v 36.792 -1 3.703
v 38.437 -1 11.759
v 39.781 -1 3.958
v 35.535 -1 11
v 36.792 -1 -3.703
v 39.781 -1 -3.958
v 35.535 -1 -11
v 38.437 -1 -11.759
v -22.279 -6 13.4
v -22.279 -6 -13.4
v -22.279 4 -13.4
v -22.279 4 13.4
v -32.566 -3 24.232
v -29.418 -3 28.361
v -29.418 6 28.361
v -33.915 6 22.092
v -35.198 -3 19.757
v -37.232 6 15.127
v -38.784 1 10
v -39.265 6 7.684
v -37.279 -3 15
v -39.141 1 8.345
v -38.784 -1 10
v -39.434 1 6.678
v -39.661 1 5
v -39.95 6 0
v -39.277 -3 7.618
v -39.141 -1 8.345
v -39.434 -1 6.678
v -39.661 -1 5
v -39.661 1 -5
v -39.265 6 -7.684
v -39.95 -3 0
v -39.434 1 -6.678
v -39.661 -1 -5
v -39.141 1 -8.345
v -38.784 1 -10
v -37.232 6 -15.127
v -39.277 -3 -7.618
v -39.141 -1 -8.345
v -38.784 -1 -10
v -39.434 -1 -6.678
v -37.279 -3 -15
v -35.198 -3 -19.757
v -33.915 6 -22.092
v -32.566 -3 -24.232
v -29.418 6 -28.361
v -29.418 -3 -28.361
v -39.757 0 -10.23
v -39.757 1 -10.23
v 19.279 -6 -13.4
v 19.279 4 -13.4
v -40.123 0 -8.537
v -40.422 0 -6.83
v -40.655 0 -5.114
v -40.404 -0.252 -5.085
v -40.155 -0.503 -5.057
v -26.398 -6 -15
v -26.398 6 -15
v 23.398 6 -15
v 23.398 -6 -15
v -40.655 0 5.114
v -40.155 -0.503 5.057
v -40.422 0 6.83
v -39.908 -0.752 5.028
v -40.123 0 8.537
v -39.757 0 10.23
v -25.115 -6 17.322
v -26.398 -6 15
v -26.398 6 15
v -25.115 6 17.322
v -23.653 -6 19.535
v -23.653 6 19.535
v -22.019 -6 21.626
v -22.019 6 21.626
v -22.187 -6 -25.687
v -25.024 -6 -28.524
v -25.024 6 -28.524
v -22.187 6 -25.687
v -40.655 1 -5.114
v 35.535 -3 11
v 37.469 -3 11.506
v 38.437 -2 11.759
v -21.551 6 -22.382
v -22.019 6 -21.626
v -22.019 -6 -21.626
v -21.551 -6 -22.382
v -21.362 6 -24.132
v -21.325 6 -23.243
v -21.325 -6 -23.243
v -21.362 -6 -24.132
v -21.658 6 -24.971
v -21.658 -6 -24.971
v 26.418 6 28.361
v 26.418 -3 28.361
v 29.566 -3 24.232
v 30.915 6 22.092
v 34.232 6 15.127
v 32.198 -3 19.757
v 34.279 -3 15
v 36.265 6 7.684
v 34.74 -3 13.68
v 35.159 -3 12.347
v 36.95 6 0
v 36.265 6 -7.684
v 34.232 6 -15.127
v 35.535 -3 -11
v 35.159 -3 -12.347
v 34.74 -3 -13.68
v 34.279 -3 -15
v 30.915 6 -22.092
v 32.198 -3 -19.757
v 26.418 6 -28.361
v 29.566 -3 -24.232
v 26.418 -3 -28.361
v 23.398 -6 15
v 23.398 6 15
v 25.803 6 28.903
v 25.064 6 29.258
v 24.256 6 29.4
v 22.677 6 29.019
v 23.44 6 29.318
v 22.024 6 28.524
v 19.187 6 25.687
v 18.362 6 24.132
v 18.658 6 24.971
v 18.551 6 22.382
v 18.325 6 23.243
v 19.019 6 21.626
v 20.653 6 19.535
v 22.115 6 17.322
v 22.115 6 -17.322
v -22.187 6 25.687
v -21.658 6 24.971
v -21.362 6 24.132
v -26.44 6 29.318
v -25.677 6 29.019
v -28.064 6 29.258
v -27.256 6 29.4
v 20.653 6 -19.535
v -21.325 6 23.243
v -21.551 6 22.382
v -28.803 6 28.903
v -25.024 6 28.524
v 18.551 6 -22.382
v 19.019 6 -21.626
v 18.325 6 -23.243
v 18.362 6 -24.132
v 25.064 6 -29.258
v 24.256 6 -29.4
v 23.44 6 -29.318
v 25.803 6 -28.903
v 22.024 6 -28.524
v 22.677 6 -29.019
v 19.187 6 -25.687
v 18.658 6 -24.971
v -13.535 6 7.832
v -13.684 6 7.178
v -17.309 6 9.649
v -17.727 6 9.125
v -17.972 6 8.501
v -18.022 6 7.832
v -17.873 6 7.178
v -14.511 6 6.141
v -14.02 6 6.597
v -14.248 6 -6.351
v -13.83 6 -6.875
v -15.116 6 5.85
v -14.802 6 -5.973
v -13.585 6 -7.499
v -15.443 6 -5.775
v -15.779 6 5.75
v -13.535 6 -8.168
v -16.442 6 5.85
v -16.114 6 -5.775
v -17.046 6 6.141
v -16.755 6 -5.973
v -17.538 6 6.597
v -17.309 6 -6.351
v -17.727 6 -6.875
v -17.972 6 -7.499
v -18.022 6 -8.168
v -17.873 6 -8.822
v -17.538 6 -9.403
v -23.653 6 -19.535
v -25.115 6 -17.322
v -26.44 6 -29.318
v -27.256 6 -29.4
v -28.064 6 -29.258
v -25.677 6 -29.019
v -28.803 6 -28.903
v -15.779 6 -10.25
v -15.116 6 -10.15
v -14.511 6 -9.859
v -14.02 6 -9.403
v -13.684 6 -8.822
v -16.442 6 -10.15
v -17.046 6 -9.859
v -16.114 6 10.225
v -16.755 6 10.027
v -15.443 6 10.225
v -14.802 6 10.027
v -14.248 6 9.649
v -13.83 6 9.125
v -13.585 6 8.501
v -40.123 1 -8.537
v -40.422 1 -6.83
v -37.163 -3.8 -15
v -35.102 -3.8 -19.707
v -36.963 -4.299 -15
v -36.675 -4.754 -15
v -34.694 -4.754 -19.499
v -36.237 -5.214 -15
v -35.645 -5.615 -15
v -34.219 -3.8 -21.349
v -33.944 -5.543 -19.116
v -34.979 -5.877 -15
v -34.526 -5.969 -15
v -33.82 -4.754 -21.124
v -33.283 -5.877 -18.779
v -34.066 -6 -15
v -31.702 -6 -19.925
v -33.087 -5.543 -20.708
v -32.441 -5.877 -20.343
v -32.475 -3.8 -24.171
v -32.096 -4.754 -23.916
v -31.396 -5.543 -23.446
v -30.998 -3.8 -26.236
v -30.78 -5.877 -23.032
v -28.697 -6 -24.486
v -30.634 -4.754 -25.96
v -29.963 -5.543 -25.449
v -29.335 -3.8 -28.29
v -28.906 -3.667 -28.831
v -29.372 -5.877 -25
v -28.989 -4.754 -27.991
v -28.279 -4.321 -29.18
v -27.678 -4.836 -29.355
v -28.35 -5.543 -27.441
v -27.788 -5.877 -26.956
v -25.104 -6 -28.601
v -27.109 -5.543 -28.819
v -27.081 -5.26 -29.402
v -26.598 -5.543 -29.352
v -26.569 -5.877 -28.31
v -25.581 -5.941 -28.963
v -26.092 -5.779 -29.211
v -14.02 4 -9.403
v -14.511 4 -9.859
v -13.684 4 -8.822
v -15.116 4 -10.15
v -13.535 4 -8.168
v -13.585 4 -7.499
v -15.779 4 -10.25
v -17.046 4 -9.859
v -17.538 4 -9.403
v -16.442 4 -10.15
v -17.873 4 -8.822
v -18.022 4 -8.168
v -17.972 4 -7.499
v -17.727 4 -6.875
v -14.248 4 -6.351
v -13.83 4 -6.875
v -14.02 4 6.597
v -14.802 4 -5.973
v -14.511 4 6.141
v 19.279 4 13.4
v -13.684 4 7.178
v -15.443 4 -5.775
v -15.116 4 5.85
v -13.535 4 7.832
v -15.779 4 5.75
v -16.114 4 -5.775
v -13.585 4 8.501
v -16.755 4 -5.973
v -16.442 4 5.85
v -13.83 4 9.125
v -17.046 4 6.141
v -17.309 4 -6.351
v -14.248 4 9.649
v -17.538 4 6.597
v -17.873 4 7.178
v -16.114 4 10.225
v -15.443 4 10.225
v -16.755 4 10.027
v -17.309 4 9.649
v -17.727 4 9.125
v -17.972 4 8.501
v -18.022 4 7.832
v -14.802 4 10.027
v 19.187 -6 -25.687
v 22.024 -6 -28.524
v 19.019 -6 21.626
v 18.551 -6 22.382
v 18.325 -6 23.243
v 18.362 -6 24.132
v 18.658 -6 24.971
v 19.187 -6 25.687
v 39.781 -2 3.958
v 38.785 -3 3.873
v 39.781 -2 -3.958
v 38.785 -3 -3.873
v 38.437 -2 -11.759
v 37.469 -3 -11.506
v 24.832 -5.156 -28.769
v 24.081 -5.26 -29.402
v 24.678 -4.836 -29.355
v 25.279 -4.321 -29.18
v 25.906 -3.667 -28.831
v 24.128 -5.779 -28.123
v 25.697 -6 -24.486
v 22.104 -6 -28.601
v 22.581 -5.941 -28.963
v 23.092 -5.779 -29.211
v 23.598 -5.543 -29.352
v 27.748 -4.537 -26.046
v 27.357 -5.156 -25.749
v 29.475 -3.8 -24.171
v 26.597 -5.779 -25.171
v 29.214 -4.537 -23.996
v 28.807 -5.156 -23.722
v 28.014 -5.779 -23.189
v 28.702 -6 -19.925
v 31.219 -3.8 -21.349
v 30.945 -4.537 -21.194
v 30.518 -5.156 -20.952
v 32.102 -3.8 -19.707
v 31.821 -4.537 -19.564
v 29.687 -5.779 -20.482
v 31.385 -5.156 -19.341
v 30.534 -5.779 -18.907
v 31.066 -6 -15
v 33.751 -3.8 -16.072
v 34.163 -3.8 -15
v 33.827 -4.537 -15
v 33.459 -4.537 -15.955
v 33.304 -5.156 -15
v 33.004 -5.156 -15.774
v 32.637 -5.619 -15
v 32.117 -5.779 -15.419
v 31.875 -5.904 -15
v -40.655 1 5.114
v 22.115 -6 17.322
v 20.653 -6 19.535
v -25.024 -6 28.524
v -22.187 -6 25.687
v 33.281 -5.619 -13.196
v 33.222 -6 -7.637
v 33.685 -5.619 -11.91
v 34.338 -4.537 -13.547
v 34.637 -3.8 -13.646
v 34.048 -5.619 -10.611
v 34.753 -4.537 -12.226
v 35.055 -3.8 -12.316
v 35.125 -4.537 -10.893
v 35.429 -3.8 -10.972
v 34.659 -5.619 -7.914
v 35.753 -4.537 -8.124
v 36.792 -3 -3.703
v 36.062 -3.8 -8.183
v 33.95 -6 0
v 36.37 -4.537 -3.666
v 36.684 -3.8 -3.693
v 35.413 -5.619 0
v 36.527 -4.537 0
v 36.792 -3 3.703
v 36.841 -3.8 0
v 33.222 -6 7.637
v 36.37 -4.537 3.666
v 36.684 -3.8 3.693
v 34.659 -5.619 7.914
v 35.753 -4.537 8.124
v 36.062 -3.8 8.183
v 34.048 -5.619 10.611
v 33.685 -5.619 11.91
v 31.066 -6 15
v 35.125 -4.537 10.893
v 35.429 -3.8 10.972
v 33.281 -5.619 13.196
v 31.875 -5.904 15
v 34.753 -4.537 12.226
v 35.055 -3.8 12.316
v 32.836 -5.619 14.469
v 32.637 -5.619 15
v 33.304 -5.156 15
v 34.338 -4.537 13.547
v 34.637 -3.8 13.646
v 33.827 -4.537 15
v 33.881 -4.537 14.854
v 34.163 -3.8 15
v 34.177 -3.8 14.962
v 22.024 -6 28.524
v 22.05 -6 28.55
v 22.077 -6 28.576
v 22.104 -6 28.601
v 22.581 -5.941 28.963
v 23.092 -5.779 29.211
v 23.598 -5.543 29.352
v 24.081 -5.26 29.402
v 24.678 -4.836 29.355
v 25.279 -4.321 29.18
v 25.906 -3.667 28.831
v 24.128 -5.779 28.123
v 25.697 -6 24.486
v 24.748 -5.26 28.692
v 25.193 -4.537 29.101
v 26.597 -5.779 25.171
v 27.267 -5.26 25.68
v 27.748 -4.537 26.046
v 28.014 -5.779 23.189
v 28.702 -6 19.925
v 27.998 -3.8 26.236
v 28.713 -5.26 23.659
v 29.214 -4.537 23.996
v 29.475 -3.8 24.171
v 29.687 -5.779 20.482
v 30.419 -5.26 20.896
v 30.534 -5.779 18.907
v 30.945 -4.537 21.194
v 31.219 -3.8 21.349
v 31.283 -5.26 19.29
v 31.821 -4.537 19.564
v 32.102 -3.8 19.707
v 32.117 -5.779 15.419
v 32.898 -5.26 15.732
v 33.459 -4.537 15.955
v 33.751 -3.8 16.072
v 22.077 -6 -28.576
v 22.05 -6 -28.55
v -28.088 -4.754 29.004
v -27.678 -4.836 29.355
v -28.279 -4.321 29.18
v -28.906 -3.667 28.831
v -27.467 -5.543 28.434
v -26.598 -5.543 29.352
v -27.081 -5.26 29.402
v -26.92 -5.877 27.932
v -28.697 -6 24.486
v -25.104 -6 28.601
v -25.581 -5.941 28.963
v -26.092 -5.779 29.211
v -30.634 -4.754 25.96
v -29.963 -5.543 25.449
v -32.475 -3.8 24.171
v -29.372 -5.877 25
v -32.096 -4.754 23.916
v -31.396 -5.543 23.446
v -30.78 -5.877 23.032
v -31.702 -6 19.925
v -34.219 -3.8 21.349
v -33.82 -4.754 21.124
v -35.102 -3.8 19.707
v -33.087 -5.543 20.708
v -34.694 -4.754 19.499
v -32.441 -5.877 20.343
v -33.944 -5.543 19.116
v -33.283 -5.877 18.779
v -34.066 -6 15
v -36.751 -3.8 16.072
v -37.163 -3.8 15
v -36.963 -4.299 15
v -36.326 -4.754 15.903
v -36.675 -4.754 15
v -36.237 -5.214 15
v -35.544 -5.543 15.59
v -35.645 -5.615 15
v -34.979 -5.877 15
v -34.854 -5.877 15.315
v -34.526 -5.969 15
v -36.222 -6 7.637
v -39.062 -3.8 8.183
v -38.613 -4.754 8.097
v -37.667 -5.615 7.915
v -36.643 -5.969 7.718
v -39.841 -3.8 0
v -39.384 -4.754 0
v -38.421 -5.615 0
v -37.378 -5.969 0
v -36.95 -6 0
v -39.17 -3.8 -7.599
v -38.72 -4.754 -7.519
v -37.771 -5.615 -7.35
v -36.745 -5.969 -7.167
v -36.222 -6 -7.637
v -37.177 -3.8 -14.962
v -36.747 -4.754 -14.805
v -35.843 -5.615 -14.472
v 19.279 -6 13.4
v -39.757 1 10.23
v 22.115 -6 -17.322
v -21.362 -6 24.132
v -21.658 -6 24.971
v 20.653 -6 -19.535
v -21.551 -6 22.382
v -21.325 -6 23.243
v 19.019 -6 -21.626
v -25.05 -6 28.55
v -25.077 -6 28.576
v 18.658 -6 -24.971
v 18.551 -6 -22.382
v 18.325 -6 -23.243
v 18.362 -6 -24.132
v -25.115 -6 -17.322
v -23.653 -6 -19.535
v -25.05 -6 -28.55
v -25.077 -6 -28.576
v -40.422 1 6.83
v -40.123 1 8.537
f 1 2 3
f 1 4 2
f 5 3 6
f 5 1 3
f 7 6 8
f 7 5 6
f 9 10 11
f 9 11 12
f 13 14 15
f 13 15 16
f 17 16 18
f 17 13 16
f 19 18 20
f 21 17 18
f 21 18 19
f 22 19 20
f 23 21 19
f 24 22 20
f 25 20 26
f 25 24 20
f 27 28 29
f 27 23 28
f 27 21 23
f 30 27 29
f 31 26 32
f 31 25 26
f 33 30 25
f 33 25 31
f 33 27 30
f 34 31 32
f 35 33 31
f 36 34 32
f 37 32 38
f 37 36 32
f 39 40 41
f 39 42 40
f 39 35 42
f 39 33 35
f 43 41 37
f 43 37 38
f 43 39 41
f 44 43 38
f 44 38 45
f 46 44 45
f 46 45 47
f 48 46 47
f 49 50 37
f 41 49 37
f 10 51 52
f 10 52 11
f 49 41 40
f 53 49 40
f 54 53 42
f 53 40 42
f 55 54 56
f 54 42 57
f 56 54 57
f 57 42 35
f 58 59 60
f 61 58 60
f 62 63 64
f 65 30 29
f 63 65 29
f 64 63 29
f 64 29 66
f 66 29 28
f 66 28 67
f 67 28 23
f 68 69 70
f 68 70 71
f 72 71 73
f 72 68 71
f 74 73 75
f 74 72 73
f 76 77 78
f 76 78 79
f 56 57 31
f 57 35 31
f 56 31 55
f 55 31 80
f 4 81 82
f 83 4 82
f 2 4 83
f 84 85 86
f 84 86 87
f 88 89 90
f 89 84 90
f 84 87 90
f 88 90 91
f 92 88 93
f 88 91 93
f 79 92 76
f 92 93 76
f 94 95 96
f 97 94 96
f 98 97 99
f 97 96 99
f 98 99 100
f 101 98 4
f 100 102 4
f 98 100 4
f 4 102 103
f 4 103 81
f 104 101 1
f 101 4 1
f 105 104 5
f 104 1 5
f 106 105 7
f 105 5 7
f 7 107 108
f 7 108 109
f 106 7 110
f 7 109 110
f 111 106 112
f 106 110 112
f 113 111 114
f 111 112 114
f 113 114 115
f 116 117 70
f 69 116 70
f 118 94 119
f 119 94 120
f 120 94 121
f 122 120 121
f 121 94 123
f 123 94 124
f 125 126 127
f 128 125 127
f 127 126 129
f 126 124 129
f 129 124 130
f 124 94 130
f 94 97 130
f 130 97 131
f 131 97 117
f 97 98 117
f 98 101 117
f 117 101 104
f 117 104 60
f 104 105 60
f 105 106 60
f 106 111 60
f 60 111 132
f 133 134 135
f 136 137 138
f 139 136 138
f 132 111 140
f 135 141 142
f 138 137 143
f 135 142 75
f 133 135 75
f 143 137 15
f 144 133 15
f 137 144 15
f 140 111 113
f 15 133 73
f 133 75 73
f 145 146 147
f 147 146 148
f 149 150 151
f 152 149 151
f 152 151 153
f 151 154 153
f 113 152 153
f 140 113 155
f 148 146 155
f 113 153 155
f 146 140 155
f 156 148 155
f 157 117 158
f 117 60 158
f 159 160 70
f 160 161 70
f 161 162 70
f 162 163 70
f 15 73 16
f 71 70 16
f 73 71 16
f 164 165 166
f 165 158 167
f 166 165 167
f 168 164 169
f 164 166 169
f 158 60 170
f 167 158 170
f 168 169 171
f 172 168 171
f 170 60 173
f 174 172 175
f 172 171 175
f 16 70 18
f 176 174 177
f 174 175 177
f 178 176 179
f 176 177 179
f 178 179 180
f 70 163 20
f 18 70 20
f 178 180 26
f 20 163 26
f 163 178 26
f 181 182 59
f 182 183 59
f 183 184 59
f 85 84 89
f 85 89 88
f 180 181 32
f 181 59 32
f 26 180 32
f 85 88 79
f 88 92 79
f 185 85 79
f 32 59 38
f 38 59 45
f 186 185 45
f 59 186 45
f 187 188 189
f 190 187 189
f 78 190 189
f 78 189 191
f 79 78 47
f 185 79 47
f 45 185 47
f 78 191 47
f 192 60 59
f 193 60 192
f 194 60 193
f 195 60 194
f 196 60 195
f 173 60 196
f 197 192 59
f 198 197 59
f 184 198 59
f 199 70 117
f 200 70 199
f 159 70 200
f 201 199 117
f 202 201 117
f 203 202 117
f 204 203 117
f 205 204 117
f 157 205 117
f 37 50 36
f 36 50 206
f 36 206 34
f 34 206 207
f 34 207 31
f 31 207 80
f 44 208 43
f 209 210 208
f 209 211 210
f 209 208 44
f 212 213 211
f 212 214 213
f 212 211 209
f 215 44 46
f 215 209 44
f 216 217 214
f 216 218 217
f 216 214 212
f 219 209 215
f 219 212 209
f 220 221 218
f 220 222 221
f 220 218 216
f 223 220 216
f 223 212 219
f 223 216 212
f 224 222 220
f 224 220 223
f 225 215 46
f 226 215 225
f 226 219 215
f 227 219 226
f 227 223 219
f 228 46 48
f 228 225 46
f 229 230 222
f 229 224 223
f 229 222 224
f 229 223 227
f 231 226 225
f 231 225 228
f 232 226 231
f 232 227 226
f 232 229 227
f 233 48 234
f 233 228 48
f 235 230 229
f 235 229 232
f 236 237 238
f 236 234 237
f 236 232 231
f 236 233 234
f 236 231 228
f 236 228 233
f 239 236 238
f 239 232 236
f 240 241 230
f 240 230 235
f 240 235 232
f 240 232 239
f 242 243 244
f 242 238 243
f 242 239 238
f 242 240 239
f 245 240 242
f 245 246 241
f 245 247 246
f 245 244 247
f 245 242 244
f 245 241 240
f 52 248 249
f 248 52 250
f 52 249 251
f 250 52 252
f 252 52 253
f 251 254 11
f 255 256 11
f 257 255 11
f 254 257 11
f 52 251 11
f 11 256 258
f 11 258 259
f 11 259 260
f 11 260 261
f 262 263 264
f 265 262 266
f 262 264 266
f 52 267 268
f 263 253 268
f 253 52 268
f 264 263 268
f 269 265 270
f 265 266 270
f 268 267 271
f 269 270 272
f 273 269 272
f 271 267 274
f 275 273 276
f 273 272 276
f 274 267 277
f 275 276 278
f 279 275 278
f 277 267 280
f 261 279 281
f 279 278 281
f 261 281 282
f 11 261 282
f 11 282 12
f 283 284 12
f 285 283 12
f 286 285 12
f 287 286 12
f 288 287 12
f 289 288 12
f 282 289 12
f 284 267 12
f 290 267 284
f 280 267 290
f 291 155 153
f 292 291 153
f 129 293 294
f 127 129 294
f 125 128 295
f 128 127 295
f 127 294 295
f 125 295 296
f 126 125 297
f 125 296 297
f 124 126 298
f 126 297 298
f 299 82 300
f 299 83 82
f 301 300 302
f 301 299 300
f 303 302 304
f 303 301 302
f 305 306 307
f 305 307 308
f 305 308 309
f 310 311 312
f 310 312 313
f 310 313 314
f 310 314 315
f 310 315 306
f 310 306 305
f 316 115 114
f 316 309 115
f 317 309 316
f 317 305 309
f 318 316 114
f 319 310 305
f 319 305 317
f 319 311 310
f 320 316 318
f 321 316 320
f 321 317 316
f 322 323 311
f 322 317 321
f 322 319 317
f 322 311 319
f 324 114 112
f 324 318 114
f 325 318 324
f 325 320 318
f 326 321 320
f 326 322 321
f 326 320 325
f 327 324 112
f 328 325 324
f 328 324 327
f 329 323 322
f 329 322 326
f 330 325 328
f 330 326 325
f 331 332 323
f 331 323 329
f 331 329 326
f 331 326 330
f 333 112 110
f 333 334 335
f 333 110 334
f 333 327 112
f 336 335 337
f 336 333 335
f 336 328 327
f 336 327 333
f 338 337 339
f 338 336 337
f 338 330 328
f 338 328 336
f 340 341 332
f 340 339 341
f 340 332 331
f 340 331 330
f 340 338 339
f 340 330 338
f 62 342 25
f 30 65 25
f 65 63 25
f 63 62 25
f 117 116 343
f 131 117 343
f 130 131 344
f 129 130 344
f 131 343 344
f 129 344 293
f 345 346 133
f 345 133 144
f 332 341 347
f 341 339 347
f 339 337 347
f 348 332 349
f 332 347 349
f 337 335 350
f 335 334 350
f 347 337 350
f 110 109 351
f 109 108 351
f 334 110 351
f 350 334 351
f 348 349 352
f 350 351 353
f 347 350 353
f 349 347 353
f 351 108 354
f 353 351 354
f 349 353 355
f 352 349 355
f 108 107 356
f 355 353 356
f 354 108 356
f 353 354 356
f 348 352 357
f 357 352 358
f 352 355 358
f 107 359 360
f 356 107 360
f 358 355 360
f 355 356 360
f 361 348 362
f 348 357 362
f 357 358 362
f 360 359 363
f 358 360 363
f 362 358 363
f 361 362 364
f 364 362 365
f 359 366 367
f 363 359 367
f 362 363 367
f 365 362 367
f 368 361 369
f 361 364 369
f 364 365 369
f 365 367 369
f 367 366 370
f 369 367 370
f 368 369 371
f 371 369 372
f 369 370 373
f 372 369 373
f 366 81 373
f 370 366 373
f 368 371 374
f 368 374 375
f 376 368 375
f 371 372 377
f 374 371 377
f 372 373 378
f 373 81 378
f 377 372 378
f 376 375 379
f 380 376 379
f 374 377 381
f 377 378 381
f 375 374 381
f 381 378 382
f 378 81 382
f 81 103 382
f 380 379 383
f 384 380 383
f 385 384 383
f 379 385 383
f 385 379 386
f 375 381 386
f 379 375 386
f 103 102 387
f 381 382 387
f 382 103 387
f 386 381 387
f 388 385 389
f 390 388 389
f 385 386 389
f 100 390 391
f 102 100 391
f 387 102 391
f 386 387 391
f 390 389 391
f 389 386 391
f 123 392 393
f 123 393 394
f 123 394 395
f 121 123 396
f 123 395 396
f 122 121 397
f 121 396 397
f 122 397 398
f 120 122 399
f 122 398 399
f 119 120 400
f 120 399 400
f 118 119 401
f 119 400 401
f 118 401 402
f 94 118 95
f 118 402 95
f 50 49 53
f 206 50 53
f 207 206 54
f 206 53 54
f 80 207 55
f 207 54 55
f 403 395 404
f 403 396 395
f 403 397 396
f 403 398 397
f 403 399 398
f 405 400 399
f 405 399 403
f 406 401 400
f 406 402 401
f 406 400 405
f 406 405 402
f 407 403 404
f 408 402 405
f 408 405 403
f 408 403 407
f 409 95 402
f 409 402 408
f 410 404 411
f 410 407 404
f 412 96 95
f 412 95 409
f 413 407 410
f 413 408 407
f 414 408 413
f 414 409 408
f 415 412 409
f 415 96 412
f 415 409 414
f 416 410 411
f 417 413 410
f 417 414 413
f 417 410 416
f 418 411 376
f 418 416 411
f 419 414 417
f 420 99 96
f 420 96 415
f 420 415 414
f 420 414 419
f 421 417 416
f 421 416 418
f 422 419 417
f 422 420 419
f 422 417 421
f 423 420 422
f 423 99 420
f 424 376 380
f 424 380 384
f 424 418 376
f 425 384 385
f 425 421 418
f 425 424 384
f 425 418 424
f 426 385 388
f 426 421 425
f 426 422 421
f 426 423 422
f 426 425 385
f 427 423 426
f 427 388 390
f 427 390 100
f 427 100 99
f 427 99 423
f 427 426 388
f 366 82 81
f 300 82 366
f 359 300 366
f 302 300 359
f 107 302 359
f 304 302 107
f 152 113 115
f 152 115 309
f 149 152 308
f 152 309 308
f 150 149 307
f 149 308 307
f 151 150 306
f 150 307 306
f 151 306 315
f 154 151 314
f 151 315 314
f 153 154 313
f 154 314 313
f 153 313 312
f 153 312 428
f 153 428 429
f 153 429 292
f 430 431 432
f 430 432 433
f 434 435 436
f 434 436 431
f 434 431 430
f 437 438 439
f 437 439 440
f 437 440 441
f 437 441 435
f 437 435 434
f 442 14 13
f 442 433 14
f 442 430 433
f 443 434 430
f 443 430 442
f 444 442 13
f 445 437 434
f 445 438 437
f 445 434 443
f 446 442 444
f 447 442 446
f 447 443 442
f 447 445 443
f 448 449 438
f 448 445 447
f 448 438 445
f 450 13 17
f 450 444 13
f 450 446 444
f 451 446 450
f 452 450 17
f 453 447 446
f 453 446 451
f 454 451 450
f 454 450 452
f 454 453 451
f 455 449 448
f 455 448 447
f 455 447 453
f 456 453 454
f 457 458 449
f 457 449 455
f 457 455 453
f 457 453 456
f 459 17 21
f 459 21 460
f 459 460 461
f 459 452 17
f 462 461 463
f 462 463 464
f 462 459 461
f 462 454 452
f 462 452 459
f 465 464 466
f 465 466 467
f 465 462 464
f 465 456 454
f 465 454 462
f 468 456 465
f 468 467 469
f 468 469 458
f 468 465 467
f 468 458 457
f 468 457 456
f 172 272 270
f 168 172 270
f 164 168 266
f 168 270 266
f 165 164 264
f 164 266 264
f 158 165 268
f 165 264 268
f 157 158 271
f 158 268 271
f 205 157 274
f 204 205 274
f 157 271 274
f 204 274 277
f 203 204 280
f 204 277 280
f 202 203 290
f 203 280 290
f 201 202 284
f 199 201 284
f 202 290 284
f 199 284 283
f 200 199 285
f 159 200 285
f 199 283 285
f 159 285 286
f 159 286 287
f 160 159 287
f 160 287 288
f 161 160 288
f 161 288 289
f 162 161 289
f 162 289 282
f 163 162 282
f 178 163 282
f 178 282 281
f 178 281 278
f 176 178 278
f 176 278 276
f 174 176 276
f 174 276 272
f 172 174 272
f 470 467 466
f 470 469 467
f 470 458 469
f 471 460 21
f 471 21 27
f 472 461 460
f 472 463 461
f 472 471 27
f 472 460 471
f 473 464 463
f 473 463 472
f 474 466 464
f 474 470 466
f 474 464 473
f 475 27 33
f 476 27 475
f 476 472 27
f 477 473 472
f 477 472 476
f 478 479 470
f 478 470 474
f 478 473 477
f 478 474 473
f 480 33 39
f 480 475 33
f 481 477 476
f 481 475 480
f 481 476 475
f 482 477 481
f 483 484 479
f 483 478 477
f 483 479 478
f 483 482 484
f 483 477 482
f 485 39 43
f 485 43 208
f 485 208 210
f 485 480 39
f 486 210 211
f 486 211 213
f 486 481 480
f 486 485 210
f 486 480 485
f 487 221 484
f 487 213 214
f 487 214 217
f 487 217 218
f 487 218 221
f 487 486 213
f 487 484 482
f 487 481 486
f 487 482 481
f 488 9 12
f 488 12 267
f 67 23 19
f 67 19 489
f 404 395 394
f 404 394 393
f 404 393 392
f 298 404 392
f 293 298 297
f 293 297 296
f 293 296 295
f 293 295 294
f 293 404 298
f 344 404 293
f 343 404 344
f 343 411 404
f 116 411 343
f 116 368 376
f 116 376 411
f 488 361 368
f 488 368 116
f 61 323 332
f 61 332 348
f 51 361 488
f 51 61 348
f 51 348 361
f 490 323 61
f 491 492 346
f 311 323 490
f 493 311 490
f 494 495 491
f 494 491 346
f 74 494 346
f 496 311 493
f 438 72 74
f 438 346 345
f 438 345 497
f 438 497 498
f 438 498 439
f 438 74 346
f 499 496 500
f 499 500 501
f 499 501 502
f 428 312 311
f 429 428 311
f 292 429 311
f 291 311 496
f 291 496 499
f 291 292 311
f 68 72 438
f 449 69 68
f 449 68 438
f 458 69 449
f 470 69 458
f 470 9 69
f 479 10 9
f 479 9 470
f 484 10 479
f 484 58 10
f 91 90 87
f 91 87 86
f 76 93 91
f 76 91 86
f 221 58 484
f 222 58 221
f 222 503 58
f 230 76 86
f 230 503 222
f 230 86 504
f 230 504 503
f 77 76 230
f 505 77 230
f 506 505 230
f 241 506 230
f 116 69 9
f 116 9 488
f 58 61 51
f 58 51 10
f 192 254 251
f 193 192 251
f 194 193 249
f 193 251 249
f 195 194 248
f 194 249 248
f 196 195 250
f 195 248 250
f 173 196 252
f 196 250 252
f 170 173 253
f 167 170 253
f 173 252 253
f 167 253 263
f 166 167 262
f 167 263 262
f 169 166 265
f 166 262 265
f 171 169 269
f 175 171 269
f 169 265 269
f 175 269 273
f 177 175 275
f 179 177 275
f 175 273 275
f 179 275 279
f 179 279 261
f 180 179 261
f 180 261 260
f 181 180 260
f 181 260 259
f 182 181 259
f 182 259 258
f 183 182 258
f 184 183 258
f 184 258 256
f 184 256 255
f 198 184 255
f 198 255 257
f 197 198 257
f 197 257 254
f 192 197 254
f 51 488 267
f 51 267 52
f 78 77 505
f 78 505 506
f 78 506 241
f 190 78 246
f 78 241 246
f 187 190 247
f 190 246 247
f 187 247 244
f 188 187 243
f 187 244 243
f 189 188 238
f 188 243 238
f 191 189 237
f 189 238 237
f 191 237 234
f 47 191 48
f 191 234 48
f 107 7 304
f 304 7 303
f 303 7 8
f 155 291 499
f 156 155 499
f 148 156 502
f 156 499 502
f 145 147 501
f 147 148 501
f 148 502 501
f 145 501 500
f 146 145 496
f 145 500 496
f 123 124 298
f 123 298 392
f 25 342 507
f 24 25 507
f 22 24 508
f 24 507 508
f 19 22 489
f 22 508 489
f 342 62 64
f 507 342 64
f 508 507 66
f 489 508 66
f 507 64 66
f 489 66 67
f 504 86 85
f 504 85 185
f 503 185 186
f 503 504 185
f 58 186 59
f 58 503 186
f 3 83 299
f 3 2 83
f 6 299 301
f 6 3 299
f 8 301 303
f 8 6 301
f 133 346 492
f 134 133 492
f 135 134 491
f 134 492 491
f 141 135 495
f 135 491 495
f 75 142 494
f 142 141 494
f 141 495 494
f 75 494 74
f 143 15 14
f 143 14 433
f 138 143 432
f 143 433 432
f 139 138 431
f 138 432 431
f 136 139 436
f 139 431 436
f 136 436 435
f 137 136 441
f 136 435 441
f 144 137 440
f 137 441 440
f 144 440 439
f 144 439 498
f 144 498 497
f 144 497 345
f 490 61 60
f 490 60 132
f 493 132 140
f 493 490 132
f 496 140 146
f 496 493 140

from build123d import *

# Parameters (mm, degrees)
BOSS_EXTRUDE1_DEPTH = 6
CUT_EXTRUDE3_REACH  = 46.328
SKETCH4_R           = 2.249999999999999
CUT_EXTRUDE5_DEPTH  = 10
FILLET2_R           = 3
CUT_EXTRUDE4_DEPTH  = 46.34730878629092
BOSS_EXTRUDE2_START = -6
BOSS_EXTRUDE2_DEPTH = 12
FILLET1_R           = 3


with BuildPart() as part:
    # Sketch1 → Boss-Extrude1 (new, symmetric)
    with BuildSketch(Plane(origin=(0, 0, 0), x_dir=(1, 0, 0), z_dir=(0, 1, 0))):
        with BuildLine():
            Line((-37.27870154872519, 15), (34.27870154872519, 15.000000000000009))
            ThreePointArc((34.27870154872519, 15.000000000000009), (36.950000000000024, -1.22e-15), (34.27870154872519, -15.000000000000009))
            Line((34.27870154872519, -15.000000000000009), (-37.27870154872519, -15))
            ThreePointArc((-37.27870154872519, -15), (-39.95000000000003, -5.32e-15), (-37.27870154872519, 15))
        make_face()
    extrude(amount=BOSS_EXTRUDE1_DEPTH, both=True)

    # Sketch4 → Cut-Extrude3 (cut, up to next)
    with BuildSketch(Plane.XZ.offset(6), mode=Mode.PRIVATE) as cut_extrude3_sk1:
        with Locations(Location((-15.7787015487252, 7.999999999999995, 0), (0, 0, 270))):
            Circle(SKETCH4_R)
    cut_extrude3_tool1 = extrude(cut_extrude3_sk1.sketch, amount=-CUT_EXTRUDE3_REACH, mode=Mode.PRIVATE) & part.part
    # Sketch4 → Cut-Extrude3 (cut, up to next)
    with BuildSketch(Plane.XZ.offset(6), mode=Mode.PRIVATE) as cut_extrude3_sk2:
        with Locations(Location((-15.778701548725197, -8.000000000000009, 0), (0, 0, 270))):
            Circle(SKETCH4_R)
    cut_extrude3_tool2 = extrude(cut_extrude3_sk2.sketch, amount=-CUT_EXTRUDE3_REACH, mode=Mode.PRIVATE) & part.part
    add(cut_extrude3_tool1.solids().sort_by_distance((-15.778702, -6, 8))[0], mode=Mode.SUBTRACT)
    add(cut_extrude3_tool2.solids().sort_by_distance((-15.778702, -6, -8))[0], mode=Mode.SUBTRACT)

    # Sketch12 → Cut-Extrude5 (cut)
    with BuildSketch(Plane.XZ.offset(6)):
        Polygon((-22.278701548725184, 13.399999999999999), (19.278701548725188, 13.399999999999999), (19.278701548725188, -13.400000000000007), (-22.27870154872518, -13.400000000000007), align=None)
    extrude(amount=-CUT_EXTRUDE5_DEPTH, mode=Mode.SUBTRACT)

    # Fillet2
    fillet2_edges = [part.edges().sort_by_distance(p)[0] for p in [
        (-39.95000000000003, -6, 8.9e-16),
        (36.95000000000002, -6, 4.4e-16),
    ]]
    fillet(fillet2_edges, radius=FILLET2_R)

    # Sweep1: sweep along a path in Sketch6
    with BuildLine(Plane(origin=(0, 0, 0), x_dir=(1, 0, 0), z_dir=(0, 1, 0))) as sweep1_path:
        ThreePointArc((-37.278701548725195, 14.999999999999964), (-39.95000000000002, -1.397e-14), (-37.27870154872519, -15))
    # Sketch5 → Sweep1 (sweep)
    with BuildSketch(Plane.XY):
        Polygon((-39.95000000000002, -0.9999999999999925), (-39.95000000000002, 1.0000000000000122), (-40.950000000000024, 1.000000000000012), (-40.95000000000002, 1.193e-14), align=None)
    sweep(path=sweep1_path.line)

    # Sketch7 → Cut-Extrude4 (cut, through all)
    with BuildSketch(Plane(origin=(0, 6, 0), x_dir=(1, 0, 0), z_dir=(0, 1, 0))):
        with BuildLine():
            ThreePointArc((-38.21722172245879, 15.345224395857285), (-39.06389342380726, 12.810834344677886), (-39.756751371527066, 10.230149597239155))
            Line((-39.75675137152708, 10.230149597239159), (-38.783596110075614, 10.000000000000009))
            ThreePointArc((-38.78359611007561, 10.000000000000005), (-38.106325517759984, 12.52262659789053), (-37.27870154872519, 14.999999999999984))
            Line((-37.27870154872519, 14.999999999999982), (-38.217221722458795, 15.345224395857288))
        make_face()
        with BuildLine():
            Line((-39.6613542419605, 5.000000000000006), (-40.65486268777063, 5.113765835871163))
            ThreePointArc((-40.65486268777062, 5.11376583587116), (-40.95, -1.11e-14), (-40.65486268777061, -5.113765835871172))
            Line((-40.65486268777063, -5.113765835871174), (-39.6613542419605, -4.999999999999996))
            ThreePointArc((-39.66135424196049, -4.999999999999993), (-39.95000000000002, 7.11e-15), (-39.661354241960495, 5.000000000000009))
        make_face()
        with BuildLine():
            Line((-38.783596110075614, -9.999999999999998), (-39.75675137152708, -10.23014959723917))
            ThreePointArc((-39.75675137152705, -10.230149597239167), (-39.06389342380725, -12.810834344677888), (-38.217221722458795, -15.345224395857272))
            Line((-38.2172217224588, -15.345224395857272), (-37.27870154872519, -14.999999999999964))
            ThreePointArc((-37.27870154872519, -14.999999999999964), (-38.10632551776, -12.522626597890516), (-38.78359611007561, -9.999999999999996))
        make_face()
    extrude(amount=-CUT_EXTRUDE4_DEPTH, mode=Mode.SUBTRACT)

    # Sweep2: sweep along a path in Sketch10
    with BuildLine(Plane(origin=(0, 0, 0), x_dir=(1, 0, 0), z_dir=(0, 1, 0))) as sweep2_path:
        ThreePointArc((35.53453936942811, -10.999999999999996), (36.95000000000002, 6.01e-15), (35.53453936942811, 11.000000000000009))
    # Sketch9 → Sweep2 (sweep)
    with BuildSketch(Plane.XY):
        Polygon((39.950000000000024, -2.000000000000001), (38.95000000000003, -3.000000000000001), (36.950000000000024, -3.000000000000001), (36.950000000000024, -1.0000000000000013), (39.950000000000024, -1.000000000000001), align=None)
    sweep(path=sweep2_path.line)

    # Sketch11 → Boss-Extrude2 (add)
    with BuildSketch(Plane(origin=(0, 0, 0), x_dir=(1, 0, 0), z_dir=(0, 1, 0)).offset(BOSS_EXTRUDE2_START)):
        with BuildLine():
            Line((-27.22378964255568, 30.72378964255532), (-20.152721830690165, 23.652721830689885))
            ThreePointArc((-20.152721830690165, 23.652721830689885), (-23.622735246228356, 19.577020528236766), (-26.39820228709416, 14.999999999999972))
            Line((-26.39820228709416, 14.999999999999972), (-37.278701548725195, 14.999999999999964))
            ThreePointArc((-37.278701548725195, 14.999999999999964), (-33.105477074075026, 23.408151319131726), (-27.22378964255568, 30.72378964255532))
        make_face()
        with BuildLine():
            Line((17.152721830690172, 23.652721830689885), (24.22378964255568, 30.72378964255532))
            ThreePointArc((24.22378964255568, 30.72378964255532), (30.10547707407503, 23.40815131913176), (34.27870154872519, 15.000000000000009))
            Line((34.27870154872519, 15.000000000000009), (23.39820228709414, 15.000000000000002))
            ThreePointArc((23.39820228709414, 15.000000000000002), (20.622735246228352, 19.577020528236762), (17.152721830690172, 23.652721830689885))
        make_face()
        with BuildLine():
            Line((34.27870154872519, -15.000000000000009), (23.39820228709414, -15.000000000000002))
            ThreePointArc((23.39820228709414, -15.000000000000002), (20.62273524622831, -19.577020528236723), (17.152721830690172, -23.652721830689885))
            Line((17.152721830690172, -23.652721830689885), (24.22378964255568, -30.72378964255532))
            ThreePointArc((24.22378964255568, -30.72378964255532), (30.105477074074965, -23.40815131913171), (34.27870154872519, -15.000000000000009))
        make_face()
        with BuildLine():
            Line((-37.278701548725195, -14.999999999999964), (-26.39820228709416, -14.999999999999972))
            ThreePointArc((-26.39820228709416, -14.999999999999972), (-23.622735246228356, -19.577020528236766), (-20.152721830690165, -23.652721830689885))
            Line((-20.152721830690165, -23.652721830689885), (-27.22378964255568, -30.72378964255532))
            ThreePointArc((-27.22378964255568, -30.72378964255532), (-33.105477074075026, -23.408151319131726), (-37.278701548725195, -14.999999999999964))
        make_face()
    extrude(amount=BOSS_EXTRUDE2_DEPTH)

    # Fillet1
    # the kernel refuses this fillet: 3 mm, written as the material it takes off along each edge
    with BuildSketch(Plane(origin=(-27.223789642555676, -14.061794859846085, -30.723789642555325), x_dir=(-0.6803801743920825, 0, 0.7328593441406063), z_dir=(0, 1, 0))) as fillet1_piece_1:
        with BuildLine():
            CenterArc((3.113392813537799, 2.997933740985829), FILLET1_R, 177.87335835873736, 94.25328328252505)
            Line((0.11545907255197221, 3.109258871386477), (0, 0))
            ThreePointArc((0, 0), (1.6123589719692206, -0.02992631805525288), (3.224717943938434, -1.4e-16))
        make_face()
    extrude(amount=28.12358971969217, mode=Mode.SUBTRACT)
    with BuildSketch(Plane(origin=(-20.15272183069017, -13.190833558911974, -23.652721830689885), x_dir=(-0.7071067811865506, 0, -0.7071067811865444), z_dir=(0, 1, 0))) as fillet1_piece_2:
        with BuildLine():
            CenterArc((2.8763334235647875, 2.9999999999999987), FILLET1_R, 184.721042367865, 85.27895763213502)
            ThreePointArc((-0.11348825738704518, 2.753086419753086), (-0.02838410706026842, 1.3777122721375448), (0, 0))
            Line((0, 0), (2.8763334235647893, -3e-17))
        make_face()
    extrude(amount=26.38166711782395, mode=Mode.SUBTRACT)
    with BuildSketch(Plane(origin=(3.5000000000005986, -6, 3.9257e-13), x_dir=(-0.983868674569183, 0, -0.1788922334856356), z_dir=(-0.1788922334856356, 0, 0.983868674569183))) as fillet1_piece_3:
        with BuildLine():
            CenterArc((43.45000000000071 - FILLET1_R, -FILLET1_R), FILLET1_R, 8.48e-15, 90)
            Line((43.45000000000071, -FILLET1_R), (43.45000000000071, 0))
            Line((43.45000000000071, 0), (43.45000000000071 - FILLET1_R, 0))
        make_face()
    revolve(axis=Axis((3.5000000000005986, -6, 3.9257e-13), (0, -1, 0)), revolution_arc=44.58500993548746, mode=Mode.SUBTRACT)
    with BuildSketch(Plane(origin=(17.15272183069017, -13.190833558911962, -23.652721830689885), x_dir=(0.6773830058582131, 0, 0.7356305209644934), z_dir=(0, 1, 0))) as fillet1_piece_4:
        with BuildLine():
            CenterArc((2.878986183031824, 2.9974543401739657), FILLET1_R, 182.3605211839325, 85.27895763213502)
            Line((-0.11846815714214187, 2.873892701417236), (0, 0))
            ThreePointArc((0, 0), (1.3777122721375474, 0.02838410706027035), (2.7554245442750958, 2e-17))
        make_face()
    extrude(amount=26.381667117823923, mode=Mode.SUBTRACT)
    with BuildSketch(Plane(origin=(24.22378964255568, -14.06179485984604, -30.72378964255532), x_dir=(-0.707106781186551, 0, 0.7071067811865441), z_dir=(0, 1, 0))) as fillet1_piece_5:
        with BuildLine():
            CenterArc((3.1114018587655967, 2.9999999999999996), FILLET1_R, 175.7467167174752, 94.25328328252476)
            ThreePointArc((0.11966404853807312, 3.222496909765141), (0.02992631805525848, 1.6123589719692129), (0, 0))
            Line((0, 0), (3.1114018587655963, 1.6e-16))
        make_face()
    extrude(amount=28.123589719692085, mode=Mode.SUBTRACT)
    with BuildSketch(Plane(origin=(-6.4999999999996945, -6, -1.6342e-13), x_dir=(0.5751444375352646, 0, -0.8180518785335342), z_dir=(-0.8180518785335342, 0, -0.5751444375352646))) as fillet1_piece_6:
        with BuildLine():
            CenterArc((43.44999999999968 - FILLET1_R, -FILLET1_R), FILLET1_R, 8.48e-15, 90)
            Line((43.44999999999968, -FILLET1_R), (43.44999999999968, 0))
            Line((43.44999999999968, 0), (43.44999999999968 - FILLET1_R, 0))
        make_face()
    revolve(axis=Axis((-6.4999999999996945, -6, -1.6342e-13), (0, -1, 0)), revolution_arc=44.58500993548848, mode=Mode.SUBTRACT)
    with BuildSketch(Plane(origin=(24.22378964255568, -14.061794859846156, 30.723789642555325), x_dir=(-0.7071067811865503, 0, -0.7071067811865447), z_dir=(0, 1, 0))) as fillet1_piece_7:
        with BuildLine():
            CenterArc((3.1114018587656367, -2.999999999999999), FILLET1_R, 90.00000000000006, 94.25328328252562)
            ThreePointArc((0.1196640485381212, -3.222496909765186), (0.02992631805528244, -1.6123589719692302), (0, 0))
            Line((0, 0), (3.1114018587656336, 8e-17))
        make_face()
    extrude(amount=28.12358971969231, mode=Mode.SUBTRACT)
    with BuildSketch(Plane(origin=(17.152721830690176, -13.190833558911836, 23.652721830689888), x_dir=(0.6773830058582013, 0, -0.7356305209645043), z_dir=(0, 1, 0))) as fillet1_piece_8:
        with BuildLine():
            CenterArc((2.8789861830317705, -2.9974543401739693), FILLET1_R, 92.36052118393214, 85.2789576321343)
            Line((-0.11846815714219594, -2.8738927014171836), (0, 0))
            ThreePointArc((0, 0), (1.377712272137523, -0.02838410706026628), (2.75542454427506, -1.6e-16))
        make_face()
    extrude(amount=26.381667117823667, mode=Mode.SUBTRACT)
    with BuildSketch(Plane(origin=(-6.500000000002743, -6, -1.78524e-12), x_dir=(0.5751444375352907, 0, 0.8180518785335158), z_dir=(-0.8180518785335158, 0, 0.5751444375352907))) as fillet1_piece_9:
        with BuildLine():
            CenterArc((43.45000000000323 - FILLET1_R, FILLET1_R), FILLET1_R, 270, 89.99999999999999)
            Line((43.45000000000323, FILLET1_R), (43.45000000000323, 0))
            Line((43.45000000000323, 0), (43.45000000000323 - FILLET1_R, 0))
        make_face()
    revolve(axis=Axis((-6.500000000002743, -6, -1.78524e-12), (0, 1, 0)), revolution_arc=44.58500993548482, mode=Mode.SUBTRACT)
    with BuildSketch(Plane(origin=(-27.223789642555676, -14.06179485984606, 30.723789642555317), x_dir=(0.7071067811865516, 0, -0.7071067811865436), z_dir=(0, 1, 0))) as fillet1_piece_10:
        with BuildLine():
            CenterArc((3.1114018587656043, 3.0000000000000018), FILLET1_R, 175.7467167174751, 94.25328328252488)
            ThreePointArc((0.11966404853808318, 3.2224969097651486), (0.02992631805526974, 1.6123589719692102), (0, 0))
            Line((0, 0), (3.111401858765604, -1e-16))
        make_face()
    extrude(amount=28.12358971969212, mode=Mode.SUBTRACT)
    with BuildSketch(Plane(origin=(-20.15272183069017, -13.190833558911962, 23.652721830689885), x_dir=(-0.6773830058582145, 0, -0.7356305209644921), z_dir=(0, 1, 0))) as fillet1_piece_11:
        with BuildLine():
            CenterArc((2.8789861830318295, 2.9974543401739657), FILLET1_R, 182.36052118393246, 85.27895763213508)
            Line((-0.11846815714213627, 2.8738927014172364), (0, 0))
            ThreePointArc((0, 0), (1.3777122721375523, 0.02838410706027291), (2.7554245442751006, -2e-17))
        make_face()
    extrude(amount=26.381667117823923, mode=Mode.SUBTRACT)
    with BuildSketch(Plane(origin=(3.5000000000005986, -6, -3.9257e-13), x_dir=(-0.5751444375352724, 0, 0.8180518785335287), z_dir=(0.8180518785335287, 0, 0.5751444375352724))) as fillet1_piece_12:
        with BuildLine():
            CenterArc((43.45000000000071 - FILLET1_R, -FILLET1_R), FILLET1_R, 8.48e-15, 90)
            Line((43.45000000000071, -FILLET1_R), (43.45000000000071, 0))
            Line((43.45000000000071, 0), (43.45000000000071 - FILLET1_R, 0))
        make_face()
    revolve(axis=Axis((3.5000000000005986, -6, -3.9257e-13), (0, -1, 0)), revolution_arc=44.58500993548747, mode=Mode.SUBTRACT)


solid = part.part
